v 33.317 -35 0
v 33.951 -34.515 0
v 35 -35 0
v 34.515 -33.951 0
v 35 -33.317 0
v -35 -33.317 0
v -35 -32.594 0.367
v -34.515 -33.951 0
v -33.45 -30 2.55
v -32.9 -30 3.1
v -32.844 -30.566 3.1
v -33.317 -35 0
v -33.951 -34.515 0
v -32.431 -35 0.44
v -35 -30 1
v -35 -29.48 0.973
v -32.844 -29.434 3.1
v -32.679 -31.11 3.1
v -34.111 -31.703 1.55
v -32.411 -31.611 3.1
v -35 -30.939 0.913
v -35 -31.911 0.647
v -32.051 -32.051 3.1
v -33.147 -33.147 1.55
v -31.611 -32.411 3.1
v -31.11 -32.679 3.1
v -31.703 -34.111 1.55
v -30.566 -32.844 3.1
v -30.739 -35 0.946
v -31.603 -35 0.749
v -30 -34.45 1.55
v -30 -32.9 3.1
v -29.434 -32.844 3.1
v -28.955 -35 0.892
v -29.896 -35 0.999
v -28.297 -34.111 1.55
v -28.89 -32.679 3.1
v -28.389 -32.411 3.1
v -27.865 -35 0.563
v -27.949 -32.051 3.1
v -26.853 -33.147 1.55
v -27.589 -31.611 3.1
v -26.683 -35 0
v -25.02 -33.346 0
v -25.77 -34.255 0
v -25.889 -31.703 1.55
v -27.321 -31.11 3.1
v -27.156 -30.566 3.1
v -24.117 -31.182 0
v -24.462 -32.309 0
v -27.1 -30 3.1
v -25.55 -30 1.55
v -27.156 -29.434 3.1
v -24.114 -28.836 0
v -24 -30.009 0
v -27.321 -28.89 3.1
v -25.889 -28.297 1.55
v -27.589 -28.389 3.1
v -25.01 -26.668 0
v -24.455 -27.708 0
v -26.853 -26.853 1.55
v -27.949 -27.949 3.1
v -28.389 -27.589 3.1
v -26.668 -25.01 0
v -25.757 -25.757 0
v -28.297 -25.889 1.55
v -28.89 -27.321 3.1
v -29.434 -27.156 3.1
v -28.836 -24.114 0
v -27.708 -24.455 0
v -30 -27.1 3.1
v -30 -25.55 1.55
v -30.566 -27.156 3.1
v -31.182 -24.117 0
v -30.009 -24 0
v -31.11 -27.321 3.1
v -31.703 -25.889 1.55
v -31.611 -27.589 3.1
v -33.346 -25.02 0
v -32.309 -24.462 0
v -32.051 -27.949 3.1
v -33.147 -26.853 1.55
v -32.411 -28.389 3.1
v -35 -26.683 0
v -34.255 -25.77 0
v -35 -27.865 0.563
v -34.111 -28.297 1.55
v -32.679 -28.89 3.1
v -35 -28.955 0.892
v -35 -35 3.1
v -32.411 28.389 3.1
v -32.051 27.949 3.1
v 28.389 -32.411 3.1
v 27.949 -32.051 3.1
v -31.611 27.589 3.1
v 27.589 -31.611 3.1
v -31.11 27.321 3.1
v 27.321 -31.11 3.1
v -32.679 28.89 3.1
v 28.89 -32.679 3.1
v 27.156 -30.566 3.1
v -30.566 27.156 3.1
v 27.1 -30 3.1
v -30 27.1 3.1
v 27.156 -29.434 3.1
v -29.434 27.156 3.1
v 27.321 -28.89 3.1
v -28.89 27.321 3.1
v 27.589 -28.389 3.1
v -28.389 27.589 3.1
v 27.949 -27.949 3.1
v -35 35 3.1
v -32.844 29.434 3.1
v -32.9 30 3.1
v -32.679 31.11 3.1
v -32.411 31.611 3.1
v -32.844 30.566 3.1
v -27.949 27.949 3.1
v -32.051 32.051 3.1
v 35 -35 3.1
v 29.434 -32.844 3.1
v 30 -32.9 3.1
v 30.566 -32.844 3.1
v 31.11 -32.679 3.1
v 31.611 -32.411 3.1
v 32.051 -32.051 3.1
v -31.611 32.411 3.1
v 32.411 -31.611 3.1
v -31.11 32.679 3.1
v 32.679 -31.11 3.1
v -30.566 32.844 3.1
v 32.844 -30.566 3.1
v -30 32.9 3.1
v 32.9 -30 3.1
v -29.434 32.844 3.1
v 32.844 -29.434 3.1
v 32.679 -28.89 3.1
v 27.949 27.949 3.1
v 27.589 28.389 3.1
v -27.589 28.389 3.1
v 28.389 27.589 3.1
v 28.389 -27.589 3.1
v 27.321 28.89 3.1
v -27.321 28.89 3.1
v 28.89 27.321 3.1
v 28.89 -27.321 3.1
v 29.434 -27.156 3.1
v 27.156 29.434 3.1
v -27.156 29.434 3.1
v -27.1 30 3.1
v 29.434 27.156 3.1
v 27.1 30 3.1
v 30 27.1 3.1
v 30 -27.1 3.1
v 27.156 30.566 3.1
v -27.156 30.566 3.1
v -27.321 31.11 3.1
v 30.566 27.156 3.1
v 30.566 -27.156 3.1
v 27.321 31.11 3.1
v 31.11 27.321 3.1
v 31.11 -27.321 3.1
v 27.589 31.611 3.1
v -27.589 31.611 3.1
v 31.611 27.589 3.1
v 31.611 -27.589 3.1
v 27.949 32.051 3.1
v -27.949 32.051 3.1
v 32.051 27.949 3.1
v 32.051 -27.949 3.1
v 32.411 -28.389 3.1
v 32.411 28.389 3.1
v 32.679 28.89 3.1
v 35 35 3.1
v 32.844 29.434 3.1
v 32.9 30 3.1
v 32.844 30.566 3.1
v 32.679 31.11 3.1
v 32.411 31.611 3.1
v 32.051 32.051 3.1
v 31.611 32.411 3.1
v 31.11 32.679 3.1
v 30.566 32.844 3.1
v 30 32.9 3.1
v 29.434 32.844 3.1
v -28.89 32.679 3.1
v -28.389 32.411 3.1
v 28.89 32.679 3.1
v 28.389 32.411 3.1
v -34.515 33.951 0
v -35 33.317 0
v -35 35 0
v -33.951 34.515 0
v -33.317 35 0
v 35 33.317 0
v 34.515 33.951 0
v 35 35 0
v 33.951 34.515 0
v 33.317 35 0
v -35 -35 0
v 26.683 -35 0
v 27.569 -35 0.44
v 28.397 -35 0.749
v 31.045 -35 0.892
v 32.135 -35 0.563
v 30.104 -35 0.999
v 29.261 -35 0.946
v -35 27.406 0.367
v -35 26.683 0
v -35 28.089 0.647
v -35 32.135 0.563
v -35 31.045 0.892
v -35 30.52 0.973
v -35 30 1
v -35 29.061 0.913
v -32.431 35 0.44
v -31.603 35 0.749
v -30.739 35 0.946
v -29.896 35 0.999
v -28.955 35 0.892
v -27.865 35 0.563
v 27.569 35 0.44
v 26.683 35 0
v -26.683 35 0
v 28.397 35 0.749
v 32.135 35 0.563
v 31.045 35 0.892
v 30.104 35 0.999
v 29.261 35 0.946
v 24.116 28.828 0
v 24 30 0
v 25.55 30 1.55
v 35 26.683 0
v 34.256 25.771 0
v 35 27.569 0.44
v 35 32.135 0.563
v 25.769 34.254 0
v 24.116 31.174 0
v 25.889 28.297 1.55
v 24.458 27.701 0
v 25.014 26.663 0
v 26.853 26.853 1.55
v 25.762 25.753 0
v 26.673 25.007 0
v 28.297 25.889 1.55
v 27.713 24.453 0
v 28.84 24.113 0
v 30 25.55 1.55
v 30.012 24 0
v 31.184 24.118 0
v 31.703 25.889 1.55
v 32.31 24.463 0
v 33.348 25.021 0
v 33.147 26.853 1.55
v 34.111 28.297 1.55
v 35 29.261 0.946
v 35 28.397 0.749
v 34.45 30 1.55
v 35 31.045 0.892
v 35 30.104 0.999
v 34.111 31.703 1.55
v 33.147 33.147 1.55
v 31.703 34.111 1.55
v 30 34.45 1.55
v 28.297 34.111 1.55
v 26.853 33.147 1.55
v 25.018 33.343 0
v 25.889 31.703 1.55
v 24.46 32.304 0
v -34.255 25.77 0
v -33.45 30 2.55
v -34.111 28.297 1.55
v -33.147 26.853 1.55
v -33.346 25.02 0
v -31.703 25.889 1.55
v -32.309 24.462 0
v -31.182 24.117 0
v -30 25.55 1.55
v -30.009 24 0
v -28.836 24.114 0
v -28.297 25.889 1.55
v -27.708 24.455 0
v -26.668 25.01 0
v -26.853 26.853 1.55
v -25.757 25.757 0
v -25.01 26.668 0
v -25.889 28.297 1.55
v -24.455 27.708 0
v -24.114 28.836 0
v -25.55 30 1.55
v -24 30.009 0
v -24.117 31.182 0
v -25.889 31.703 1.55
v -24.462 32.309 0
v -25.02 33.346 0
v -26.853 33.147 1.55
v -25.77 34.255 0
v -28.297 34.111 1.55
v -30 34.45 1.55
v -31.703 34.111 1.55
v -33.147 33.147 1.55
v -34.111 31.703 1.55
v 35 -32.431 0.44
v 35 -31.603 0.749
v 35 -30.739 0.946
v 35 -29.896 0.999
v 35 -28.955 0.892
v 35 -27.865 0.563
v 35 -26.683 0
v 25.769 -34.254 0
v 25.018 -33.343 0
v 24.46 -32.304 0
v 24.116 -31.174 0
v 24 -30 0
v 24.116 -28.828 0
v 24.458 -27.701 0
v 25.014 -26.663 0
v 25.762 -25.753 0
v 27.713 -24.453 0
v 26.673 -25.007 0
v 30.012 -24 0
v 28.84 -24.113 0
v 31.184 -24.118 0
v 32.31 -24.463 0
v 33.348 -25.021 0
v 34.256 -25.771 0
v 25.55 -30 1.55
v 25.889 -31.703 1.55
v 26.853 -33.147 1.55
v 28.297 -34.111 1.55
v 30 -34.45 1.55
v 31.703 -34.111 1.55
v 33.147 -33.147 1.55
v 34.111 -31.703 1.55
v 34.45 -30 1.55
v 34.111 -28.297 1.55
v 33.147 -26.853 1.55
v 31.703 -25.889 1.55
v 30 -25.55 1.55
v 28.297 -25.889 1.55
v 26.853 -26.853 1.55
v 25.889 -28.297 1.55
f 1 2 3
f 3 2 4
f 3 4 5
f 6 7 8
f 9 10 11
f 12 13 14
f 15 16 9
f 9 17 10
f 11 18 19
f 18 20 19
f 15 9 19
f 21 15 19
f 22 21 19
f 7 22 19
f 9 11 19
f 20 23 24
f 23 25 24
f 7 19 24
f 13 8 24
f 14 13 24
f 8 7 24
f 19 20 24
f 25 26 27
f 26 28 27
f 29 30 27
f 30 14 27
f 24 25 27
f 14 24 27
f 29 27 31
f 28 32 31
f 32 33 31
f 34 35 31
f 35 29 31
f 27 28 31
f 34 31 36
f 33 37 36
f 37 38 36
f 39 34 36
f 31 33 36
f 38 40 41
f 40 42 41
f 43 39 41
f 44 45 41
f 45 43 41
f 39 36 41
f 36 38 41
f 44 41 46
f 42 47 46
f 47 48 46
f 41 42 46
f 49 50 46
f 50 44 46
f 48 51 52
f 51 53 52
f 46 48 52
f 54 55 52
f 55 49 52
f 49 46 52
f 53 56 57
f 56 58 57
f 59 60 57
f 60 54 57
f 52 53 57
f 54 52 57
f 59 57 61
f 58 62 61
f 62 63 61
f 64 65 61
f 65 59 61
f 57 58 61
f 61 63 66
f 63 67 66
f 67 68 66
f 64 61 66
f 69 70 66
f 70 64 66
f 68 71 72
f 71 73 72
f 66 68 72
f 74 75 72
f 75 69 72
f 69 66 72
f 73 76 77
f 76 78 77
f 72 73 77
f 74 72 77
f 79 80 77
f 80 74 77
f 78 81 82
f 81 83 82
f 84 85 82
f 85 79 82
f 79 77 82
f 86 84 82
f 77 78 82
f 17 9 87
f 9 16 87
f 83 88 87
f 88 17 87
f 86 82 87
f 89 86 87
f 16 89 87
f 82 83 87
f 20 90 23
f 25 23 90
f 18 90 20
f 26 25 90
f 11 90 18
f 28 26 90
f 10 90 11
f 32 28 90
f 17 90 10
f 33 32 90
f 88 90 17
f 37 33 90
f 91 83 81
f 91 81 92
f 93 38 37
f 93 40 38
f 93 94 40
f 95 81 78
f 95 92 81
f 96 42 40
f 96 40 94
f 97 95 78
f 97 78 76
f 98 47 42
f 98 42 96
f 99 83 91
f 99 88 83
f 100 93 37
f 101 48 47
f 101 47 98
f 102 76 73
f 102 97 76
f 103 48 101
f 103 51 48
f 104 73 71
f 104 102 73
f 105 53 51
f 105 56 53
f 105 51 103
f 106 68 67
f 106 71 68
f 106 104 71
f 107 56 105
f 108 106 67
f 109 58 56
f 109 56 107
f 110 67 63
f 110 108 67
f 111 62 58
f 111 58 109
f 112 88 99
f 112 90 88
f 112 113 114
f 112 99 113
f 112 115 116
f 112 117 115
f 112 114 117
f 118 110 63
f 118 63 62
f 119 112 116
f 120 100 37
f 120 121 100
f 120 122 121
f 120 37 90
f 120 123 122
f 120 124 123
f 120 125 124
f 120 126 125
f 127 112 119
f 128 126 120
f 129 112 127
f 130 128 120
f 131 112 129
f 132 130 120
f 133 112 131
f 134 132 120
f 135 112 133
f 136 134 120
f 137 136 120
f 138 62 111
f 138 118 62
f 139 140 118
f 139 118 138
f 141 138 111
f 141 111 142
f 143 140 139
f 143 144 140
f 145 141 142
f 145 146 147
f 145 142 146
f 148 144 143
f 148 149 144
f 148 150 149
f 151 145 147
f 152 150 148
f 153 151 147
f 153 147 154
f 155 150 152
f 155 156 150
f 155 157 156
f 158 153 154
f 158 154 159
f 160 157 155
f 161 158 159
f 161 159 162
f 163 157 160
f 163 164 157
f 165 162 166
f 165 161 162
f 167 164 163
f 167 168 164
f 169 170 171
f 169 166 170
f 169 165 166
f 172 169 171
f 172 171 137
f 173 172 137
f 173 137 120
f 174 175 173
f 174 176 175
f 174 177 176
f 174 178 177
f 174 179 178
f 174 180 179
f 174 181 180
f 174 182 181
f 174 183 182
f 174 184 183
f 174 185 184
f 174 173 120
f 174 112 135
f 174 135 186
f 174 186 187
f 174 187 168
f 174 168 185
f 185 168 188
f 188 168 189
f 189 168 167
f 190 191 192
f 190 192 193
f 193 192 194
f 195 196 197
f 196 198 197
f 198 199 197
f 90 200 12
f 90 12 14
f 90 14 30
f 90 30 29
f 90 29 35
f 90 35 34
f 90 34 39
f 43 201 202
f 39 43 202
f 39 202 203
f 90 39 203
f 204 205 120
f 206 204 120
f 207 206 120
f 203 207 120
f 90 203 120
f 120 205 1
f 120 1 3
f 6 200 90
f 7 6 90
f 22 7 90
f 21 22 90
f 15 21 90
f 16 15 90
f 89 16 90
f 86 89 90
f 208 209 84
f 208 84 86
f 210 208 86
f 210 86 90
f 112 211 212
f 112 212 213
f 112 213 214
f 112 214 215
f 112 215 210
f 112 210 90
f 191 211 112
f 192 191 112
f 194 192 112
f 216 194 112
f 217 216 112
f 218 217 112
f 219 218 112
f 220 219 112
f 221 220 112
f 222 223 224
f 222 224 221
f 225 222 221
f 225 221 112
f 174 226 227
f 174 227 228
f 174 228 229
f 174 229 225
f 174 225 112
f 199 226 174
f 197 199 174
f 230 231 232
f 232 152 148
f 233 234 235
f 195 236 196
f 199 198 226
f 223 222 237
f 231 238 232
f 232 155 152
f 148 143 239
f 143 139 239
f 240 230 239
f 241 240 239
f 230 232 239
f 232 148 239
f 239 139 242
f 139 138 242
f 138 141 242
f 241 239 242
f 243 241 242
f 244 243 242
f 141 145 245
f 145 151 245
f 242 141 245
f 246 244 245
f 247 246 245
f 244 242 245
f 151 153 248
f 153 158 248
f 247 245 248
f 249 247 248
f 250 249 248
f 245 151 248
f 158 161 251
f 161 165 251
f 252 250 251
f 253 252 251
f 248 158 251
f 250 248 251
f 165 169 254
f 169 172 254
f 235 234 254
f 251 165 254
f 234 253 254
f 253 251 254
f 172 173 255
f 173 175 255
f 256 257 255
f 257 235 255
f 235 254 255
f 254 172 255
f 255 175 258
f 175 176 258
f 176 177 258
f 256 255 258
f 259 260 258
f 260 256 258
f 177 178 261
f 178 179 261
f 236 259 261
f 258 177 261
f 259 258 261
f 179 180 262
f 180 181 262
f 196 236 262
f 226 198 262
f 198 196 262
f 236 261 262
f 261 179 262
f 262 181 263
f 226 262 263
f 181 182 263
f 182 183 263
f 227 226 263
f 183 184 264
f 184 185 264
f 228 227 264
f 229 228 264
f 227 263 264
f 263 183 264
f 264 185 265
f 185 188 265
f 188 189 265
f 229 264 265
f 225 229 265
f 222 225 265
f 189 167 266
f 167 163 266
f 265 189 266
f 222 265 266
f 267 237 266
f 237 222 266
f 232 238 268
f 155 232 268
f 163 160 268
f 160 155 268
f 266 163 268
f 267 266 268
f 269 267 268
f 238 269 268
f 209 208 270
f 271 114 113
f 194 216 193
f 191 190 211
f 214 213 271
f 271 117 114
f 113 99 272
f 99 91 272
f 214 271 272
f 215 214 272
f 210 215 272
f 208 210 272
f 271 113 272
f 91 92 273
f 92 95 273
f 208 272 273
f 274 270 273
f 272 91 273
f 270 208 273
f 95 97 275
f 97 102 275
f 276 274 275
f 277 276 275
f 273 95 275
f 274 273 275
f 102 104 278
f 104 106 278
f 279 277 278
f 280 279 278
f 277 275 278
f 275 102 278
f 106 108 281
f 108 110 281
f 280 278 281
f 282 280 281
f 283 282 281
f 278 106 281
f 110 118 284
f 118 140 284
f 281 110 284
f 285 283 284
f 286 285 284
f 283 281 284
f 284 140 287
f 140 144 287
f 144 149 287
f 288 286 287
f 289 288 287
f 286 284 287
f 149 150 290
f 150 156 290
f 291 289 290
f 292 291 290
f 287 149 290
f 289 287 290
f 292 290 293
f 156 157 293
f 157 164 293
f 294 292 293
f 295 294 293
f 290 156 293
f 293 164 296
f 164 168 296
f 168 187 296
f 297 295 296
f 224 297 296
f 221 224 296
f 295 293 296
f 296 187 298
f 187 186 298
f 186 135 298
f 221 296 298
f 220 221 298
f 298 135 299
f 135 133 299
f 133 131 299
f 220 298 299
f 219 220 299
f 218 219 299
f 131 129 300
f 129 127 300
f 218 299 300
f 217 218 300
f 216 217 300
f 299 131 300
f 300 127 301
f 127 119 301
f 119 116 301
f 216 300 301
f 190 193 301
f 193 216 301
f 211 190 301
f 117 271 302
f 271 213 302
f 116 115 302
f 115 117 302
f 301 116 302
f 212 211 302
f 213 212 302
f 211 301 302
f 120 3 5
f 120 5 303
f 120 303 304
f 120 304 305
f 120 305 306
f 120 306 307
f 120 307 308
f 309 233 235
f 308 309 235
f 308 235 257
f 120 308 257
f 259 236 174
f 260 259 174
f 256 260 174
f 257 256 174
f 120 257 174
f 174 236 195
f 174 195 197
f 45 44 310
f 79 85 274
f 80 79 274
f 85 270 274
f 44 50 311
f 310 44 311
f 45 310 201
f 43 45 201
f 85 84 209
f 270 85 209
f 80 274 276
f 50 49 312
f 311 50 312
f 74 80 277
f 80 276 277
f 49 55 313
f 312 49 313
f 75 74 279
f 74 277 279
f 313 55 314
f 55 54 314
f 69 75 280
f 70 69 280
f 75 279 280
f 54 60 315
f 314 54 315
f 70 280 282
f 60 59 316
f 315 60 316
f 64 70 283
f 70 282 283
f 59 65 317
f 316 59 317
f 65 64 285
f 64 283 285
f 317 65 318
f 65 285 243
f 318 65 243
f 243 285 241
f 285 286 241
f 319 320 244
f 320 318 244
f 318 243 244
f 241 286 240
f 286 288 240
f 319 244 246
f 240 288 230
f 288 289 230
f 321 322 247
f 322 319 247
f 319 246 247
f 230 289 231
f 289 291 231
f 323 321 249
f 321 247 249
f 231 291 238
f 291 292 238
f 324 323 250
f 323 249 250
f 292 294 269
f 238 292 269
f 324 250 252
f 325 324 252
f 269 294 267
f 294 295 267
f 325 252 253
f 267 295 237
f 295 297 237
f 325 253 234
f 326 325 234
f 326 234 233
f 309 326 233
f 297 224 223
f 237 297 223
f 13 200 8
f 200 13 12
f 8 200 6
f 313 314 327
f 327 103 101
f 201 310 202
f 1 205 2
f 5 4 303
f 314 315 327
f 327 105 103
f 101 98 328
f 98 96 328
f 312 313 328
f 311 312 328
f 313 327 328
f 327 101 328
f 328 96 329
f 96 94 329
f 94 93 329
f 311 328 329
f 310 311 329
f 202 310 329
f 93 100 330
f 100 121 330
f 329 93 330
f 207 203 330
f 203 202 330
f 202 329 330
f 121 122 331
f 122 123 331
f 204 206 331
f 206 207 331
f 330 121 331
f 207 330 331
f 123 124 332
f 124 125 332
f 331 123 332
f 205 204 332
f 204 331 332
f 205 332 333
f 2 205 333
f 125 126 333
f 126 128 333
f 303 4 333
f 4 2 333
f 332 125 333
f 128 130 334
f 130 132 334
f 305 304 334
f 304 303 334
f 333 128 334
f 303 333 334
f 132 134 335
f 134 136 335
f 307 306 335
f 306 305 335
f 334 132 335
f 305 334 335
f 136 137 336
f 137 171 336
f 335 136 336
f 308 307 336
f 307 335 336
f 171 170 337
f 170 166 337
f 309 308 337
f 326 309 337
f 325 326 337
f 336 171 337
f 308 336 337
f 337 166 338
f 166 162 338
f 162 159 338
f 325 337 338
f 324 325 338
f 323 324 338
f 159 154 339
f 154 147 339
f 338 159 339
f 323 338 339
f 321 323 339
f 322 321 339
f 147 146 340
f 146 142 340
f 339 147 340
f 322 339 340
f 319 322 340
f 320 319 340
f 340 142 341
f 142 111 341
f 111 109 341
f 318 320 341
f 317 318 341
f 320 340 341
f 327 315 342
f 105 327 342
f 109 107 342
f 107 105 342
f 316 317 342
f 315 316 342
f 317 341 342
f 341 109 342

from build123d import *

# Parameters (mm, degrees)
F0_W           = 70
F0_H           = 70
F0_W_2         = 60
F0_H_2         = 60
F1_DEPTH       = 3.1
F2_D           = 4
F2_DEPTH       = 15
F2_CSINK_D     = 12
F2_CSINK_ANGLE = 90
F2_TIP         = 1.2017212381


with BuildPart() as f1:
    # F0 (on Top) → F1 (new body)
    with BuildSketch(Plane.XY):
        Rectangle(F0_W, F0_H)
        Rectangle(F0_W_2, F0_H_2, mode=Mode.SUBTRACT)
        Rectangle(F0_W_2, F0_H_2)
    extrude(amount=F1_DEPTH)

    # F2
    with Locations(Plane(origin=(0, 0, 0), x_dir=(1, 0, 0), z_dir=(0, 0, -1))):
        with Locations((-30, -30), (30, -30), (30, 30), (-30, 30)):
            CounterSinkHole(F2_D / 2, F2_CSINK_D / 2, depth=F2_DEPTH, counter_sink_angle=F2_CSINK_ANGLE)
            with Locations((0, 0, -(F2_DEPTH + F2_TIP / 2))):  # 118° drill point
                Cone(0, F2_D / 2, F2_TIP, mode=Mode.SUBTRACT)


solid = f1.part
